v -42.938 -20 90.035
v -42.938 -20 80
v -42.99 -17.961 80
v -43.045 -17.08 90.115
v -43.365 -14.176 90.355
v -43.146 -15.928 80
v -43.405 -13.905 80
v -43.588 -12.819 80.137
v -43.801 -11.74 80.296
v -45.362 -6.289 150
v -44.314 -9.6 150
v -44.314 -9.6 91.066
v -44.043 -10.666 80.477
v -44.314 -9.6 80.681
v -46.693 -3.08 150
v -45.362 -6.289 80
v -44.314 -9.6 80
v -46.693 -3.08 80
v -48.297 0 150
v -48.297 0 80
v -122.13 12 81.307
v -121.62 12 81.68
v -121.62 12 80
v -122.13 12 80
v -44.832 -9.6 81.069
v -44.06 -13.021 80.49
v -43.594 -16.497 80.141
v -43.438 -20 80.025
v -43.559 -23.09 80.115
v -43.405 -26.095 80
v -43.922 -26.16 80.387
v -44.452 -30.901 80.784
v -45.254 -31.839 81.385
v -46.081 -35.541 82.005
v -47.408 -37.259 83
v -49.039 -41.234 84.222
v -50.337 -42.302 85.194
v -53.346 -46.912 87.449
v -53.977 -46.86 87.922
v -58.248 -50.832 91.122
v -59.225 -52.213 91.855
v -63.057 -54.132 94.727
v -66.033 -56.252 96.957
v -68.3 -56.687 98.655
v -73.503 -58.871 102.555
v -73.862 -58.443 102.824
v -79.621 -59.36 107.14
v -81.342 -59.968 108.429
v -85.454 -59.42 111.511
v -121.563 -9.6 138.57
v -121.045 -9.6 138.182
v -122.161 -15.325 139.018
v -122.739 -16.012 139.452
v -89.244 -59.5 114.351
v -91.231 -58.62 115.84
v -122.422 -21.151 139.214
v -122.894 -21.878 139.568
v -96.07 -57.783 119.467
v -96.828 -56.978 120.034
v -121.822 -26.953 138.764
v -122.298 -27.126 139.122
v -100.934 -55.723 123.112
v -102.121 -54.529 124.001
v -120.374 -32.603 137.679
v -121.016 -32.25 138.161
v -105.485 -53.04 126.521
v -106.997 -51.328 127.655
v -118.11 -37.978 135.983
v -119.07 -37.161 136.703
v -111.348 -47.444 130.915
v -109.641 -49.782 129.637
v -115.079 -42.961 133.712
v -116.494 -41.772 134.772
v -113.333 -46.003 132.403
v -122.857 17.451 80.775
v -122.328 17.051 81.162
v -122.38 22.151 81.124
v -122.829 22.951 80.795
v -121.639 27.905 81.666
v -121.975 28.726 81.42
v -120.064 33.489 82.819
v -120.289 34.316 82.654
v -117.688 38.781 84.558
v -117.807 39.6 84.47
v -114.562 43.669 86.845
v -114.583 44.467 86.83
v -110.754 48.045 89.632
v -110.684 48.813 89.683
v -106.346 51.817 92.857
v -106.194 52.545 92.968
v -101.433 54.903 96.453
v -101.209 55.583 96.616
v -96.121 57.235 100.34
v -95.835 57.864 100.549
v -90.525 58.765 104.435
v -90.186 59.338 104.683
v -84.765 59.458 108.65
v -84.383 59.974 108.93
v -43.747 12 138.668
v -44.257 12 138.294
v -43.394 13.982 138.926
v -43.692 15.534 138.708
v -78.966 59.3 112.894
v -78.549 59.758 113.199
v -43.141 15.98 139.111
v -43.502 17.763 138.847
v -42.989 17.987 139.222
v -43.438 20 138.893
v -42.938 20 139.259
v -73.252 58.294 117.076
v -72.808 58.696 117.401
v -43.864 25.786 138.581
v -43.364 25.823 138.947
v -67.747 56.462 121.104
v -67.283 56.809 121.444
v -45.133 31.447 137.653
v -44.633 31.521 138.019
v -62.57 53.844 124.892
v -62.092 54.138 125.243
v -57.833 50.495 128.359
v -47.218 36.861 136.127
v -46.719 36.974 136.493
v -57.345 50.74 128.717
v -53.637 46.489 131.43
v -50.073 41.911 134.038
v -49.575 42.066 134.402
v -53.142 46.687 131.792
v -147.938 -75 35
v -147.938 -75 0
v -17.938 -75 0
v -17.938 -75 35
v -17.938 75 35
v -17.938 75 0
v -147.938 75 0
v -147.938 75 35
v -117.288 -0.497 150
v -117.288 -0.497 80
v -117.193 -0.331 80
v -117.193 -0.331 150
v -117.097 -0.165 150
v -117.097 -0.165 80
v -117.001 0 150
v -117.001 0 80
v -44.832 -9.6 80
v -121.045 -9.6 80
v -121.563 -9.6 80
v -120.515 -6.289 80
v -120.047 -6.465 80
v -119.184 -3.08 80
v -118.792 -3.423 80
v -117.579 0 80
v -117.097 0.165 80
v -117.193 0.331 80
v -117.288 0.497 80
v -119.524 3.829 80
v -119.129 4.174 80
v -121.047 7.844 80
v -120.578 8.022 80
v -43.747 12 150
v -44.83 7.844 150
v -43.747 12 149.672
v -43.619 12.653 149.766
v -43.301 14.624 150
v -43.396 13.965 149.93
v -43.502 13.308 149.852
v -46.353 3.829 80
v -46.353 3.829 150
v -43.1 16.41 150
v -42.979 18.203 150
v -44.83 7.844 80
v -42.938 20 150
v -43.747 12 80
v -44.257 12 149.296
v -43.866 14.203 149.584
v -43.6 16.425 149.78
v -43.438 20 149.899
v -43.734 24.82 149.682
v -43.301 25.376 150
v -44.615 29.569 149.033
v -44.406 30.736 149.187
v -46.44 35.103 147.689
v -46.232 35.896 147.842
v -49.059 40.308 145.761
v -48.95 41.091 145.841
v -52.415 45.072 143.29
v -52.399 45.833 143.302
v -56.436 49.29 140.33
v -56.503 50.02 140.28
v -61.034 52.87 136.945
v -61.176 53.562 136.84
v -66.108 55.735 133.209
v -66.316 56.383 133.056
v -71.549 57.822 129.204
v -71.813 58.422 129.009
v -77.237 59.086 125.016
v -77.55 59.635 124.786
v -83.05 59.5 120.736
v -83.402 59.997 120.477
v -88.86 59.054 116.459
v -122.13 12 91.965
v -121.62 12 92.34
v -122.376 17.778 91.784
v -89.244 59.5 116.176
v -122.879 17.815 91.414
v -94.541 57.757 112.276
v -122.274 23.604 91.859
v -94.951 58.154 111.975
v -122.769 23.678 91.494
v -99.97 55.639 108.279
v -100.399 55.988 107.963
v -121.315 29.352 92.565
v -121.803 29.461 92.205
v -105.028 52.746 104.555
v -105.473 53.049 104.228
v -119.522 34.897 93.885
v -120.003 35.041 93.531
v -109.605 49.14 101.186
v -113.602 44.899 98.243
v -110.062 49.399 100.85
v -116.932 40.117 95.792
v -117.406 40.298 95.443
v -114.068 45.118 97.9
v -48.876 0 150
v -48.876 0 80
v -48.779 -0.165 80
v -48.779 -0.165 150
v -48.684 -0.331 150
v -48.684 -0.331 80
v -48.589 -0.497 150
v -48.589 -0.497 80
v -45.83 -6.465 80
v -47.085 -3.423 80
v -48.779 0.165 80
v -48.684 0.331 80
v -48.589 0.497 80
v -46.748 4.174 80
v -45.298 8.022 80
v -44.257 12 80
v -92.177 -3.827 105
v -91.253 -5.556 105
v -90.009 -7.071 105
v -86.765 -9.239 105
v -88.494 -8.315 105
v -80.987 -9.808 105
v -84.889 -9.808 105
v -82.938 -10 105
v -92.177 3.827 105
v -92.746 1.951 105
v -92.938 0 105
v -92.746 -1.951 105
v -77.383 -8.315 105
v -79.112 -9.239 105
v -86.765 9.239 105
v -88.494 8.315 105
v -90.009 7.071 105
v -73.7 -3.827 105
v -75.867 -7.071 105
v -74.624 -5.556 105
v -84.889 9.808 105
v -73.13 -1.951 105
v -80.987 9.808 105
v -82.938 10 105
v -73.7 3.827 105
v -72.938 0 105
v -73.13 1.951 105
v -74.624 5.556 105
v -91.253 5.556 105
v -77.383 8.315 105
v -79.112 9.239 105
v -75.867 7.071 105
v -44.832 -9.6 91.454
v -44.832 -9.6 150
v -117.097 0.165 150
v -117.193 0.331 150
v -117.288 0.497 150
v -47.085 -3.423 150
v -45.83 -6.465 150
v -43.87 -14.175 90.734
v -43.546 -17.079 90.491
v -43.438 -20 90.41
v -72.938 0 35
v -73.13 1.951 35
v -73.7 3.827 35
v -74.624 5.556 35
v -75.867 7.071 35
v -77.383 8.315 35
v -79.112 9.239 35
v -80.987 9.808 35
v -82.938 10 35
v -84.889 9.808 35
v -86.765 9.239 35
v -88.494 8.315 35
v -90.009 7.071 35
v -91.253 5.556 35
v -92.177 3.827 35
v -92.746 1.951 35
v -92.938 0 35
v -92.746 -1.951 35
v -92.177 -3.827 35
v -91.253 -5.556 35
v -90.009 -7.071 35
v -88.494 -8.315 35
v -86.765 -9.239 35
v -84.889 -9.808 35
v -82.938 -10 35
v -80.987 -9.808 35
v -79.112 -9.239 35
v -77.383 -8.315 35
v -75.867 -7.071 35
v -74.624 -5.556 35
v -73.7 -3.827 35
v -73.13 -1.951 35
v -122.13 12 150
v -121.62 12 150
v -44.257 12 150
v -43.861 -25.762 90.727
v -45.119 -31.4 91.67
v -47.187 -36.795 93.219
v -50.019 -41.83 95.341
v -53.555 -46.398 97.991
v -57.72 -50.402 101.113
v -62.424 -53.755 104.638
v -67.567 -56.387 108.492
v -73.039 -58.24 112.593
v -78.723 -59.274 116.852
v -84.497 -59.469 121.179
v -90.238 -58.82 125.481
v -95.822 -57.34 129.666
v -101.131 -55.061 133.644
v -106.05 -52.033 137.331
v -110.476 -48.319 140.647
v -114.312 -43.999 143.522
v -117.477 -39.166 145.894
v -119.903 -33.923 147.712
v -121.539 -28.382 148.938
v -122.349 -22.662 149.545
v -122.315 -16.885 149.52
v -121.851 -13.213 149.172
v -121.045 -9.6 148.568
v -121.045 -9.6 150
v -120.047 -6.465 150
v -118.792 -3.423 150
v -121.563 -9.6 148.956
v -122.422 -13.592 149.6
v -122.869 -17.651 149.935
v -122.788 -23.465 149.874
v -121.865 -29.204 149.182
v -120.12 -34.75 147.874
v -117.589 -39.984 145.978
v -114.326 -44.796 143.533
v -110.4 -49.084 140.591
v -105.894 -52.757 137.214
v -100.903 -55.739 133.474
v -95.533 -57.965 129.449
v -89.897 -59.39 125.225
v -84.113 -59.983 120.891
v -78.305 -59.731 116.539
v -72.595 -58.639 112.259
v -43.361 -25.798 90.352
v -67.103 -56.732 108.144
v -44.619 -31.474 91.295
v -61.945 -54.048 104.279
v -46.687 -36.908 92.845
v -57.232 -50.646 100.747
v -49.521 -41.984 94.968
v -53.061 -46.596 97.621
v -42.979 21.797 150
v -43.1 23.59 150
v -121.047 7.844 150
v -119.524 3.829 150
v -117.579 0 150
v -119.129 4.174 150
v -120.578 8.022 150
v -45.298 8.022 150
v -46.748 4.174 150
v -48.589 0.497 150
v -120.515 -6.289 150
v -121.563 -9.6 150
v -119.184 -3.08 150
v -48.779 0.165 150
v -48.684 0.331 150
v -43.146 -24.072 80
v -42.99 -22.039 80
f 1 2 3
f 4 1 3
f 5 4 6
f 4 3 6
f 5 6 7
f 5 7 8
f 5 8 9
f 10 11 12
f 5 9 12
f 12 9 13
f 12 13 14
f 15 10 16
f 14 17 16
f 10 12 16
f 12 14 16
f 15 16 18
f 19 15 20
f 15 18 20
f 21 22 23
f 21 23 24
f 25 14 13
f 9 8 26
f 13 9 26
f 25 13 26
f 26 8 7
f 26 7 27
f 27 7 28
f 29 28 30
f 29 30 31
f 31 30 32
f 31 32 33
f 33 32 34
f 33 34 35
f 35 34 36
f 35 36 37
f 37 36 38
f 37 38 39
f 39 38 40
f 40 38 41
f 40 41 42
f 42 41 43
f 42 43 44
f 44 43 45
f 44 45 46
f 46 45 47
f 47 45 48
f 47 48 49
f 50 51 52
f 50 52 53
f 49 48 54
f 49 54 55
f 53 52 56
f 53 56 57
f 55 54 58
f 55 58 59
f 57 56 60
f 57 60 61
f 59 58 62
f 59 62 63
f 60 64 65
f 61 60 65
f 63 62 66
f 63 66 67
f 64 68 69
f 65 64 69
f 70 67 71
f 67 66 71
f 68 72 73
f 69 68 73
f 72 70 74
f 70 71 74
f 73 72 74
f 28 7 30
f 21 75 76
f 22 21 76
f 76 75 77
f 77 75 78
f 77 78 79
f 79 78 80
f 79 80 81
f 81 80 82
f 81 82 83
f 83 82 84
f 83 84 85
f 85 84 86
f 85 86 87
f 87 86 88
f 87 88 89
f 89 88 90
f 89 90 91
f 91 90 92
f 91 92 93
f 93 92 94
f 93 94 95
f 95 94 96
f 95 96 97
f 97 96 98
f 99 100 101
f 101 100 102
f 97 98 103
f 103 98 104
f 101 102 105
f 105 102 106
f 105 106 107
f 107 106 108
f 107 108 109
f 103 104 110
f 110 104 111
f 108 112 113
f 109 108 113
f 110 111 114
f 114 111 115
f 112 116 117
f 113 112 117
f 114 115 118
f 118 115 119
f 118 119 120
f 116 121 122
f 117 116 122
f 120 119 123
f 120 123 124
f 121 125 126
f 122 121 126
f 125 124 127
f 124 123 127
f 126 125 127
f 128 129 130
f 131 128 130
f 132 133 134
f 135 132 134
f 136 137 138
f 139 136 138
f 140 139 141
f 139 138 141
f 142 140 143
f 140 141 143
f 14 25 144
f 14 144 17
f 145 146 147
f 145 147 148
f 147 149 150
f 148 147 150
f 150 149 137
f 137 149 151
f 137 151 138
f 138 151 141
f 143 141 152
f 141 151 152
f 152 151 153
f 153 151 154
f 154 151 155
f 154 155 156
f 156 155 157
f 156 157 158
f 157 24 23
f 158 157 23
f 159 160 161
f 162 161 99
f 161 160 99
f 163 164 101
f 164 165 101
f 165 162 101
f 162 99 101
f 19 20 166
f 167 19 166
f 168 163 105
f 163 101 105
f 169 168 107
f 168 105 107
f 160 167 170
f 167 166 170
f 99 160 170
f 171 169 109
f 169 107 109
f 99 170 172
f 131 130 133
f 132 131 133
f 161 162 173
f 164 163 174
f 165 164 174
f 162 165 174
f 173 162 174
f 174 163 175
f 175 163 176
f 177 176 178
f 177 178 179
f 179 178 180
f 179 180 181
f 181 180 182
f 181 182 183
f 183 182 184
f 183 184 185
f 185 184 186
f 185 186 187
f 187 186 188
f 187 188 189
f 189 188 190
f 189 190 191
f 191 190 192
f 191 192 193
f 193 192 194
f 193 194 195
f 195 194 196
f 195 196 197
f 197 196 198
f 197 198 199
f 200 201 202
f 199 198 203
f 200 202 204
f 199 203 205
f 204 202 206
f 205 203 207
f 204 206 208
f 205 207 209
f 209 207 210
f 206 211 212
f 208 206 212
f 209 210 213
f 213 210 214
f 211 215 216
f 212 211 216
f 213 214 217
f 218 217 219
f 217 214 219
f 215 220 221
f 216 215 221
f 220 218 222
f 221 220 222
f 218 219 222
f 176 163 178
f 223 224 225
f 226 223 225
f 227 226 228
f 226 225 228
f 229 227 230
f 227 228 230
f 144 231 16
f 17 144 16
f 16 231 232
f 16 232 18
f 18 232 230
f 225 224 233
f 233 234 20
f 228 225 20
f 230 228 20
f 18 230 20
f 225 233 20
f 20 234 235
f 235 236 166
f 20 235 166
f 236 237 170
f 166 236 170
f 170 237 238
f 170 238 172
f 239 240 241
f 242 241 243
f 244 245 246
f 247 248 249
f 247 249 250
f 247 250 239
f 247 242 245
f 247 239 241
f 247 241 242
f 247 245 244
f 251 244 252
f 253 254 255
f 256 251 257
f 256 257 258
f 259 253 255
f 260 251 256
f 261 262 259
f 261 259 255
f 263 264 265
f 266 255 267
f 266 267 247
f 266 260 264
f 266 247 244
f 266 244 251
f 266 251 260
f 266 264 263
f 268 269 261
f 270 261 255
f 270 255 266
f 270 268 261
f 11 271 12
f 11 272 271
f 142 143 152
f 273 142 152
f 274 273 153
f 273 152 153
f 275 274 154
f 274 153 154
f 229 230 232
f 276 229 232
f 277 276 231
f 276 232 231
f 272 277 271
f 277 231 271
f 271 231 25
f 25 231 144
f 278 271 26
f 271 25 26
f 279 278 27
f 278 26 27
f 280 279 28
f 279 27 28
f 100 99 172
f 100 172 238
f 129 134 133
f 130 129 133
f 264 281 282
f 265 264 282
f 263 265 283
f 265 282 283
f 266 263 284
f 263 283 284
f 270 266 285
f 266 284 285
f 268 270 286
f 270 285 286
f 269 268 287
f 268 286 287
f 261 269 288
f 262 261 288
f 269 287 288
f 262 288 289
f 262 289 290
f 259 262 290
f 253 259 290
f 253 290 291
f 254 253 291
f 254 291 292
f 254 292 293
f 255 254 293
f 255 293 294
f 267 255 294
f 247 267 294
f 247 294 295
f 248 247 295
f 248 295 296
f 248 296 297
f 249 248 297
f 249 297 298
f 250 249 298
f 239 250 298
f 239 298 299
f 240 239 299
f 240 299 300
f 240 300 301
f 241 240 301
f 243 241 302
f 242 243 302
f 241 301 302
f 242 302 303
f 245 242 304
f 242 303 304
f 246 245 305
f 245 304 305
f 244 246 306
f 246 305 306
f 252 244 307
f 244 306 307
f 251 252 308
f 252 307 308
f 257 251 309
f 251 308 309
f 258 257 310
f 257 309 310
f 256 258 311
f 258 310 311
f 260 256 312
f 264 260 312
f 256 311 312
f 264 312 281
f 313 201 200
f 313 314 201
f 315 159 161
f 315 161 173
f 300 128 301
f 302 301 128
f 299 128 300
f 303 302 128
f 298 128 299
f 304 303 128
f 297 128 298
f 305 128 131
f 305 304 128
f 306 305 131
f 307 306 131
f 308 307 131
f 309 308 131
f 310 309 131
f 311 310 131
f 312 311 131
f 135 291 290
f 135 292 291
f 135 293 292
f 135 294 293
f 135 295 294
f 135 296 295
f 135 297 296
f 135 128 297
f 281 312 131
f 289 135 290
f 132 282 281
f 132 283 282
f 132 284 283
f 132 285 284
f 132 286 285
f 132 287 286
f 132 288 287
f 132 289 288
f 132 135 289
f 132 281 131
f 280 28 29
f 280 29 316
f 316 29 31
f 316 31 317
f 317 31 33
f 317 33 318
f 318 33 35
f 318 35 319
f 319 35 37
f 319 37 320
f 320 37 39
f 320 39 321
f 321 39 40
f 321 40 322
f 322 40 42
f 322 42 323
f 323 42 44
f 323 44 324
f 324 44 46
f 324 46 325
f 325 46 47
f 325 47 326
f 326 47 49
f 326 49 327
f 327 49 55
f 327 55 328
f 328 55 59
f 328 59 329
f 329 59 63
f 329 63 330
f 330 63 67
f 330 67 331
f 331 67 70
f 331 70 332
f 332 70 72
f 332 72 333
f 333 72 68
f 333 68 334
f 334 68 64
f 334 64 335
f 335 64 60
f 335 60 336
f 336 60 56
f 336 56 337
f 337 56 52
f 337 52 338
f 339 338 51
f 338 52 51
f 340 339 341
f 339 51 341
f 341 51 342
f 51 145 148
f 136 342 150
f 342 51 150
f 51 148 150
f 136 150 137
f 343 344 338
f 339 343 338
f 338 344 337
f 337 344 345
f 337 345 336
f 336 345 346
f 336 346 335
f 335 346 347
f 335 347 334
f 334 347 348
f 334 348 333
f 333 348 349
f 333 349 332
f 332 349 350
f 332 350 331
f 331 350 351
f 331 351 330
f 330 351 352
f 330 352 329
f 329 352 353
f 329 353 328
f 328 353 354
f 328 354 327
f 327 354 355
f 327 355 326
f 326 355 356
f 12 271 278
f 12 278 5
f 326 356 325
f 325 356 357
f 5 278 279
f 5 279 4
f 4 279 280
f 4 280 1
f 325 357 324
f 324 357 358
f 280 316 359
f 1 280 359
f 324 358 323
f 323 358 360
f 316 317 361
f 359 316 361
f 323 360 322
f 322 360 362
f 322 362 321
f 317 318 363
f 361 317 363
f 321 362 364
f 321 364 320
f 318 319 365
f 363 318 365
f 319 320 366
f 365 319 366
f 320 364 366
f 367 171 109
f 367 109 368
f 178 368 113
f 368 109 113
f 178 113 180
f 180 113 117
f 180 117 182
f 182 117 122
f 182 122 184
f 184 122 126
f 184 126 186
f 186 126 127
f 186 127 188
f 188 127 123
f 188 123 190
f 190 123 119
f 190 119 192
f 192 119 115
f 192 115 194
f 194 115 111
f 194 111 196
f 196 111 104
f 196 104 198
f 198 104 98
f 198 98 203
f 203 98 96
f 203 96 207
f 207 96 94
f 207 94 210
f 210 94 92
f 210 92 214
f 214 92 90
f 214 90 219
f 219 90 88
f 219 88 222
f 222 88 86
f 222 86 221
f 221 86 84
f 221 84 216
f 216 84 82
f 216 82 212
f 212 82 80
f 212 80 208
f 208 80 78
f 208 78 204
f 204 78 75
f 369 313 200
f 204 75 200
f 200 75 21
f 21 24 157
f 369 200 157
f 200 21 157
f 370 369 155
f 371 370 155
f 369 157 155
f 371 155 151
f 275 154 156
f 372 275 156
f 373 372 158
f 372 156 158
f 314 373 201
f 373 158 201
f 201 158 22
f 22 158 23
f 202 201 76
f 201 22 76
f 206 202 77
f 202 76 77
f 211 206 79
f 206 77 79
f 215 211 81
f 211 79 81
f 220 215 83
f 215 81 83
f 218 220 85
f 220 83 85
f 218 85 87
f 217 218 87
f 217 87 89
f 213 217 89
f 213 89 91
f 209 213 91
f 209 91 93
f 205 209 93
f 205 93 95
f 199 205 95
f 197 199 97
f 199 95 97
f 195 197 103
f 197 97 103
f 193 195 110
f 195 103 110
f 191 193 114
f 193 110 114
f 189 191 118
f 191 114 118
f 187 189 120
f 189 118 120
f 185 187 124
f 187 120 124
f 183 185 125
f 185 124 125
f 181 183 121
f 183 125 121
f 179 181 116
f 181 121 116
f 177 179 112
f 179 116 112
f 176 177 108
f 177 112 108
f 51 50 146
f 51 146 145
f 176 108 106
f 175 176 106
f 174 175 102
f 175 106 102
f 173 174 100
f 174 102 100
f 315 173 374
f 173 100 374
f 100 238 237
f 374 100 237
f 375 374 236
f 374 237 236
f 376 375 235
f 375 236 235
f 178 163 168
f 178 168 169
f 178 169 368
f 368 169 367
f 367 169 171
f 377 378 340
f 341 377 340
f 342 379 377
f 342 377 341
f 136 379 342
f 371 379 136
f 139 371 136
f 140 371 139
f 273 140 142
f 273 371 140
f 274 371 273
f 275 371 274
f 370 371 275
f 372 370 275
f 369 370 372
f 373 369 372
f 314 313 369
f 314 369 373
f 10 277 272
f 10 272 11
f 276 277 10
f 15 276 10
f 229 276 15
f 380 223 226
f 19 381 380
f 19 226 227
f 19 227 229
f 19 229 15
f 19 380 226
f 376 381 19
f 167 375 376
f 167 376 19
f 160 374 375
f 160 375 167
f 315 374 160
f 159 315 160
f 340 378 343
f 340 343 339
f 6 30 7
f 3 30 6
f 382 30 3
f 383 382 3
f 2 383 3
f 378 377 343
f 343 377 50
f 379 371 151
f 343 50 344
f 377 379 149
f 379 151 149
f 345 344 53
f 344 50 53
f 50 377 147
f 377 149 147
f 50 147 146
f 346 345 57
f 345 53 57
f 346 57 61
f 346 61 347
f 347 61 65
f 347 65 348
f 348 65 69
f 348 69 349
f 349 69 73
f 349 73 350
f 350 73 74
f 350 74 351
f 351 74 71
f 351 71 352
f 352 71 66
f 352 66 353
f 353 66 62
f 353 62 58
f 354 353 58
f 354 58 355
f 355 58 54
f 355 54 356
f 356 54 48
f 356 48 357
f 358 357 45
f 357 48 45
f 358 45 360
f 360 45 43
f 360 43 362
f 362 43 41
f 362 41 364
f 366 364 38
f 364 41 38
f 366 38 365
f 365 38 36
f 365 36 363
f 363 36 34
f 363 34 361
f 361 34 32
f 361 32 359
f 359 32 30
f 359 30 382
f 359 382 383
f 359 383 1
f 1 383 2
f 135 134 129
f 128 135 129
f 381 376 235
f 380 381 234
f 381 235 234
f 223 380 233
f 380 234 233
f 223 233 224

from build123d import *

# Parameters (mm, degrees)
F1_DEPTH = 35
F2_R     = 10
F3_DEPTH = 45
F5_DEPTH = 70
F7_DEPTH = 63
F9_DEPTH = 65.4


with BuildPart() as f1:
    # F0 (on Top) → F1 (new body)
    with BuildSketch(Plane.XY):
        Polygon((-147.9383396478, 75), (-147.9383396478, 0), (-147.9383396478, -75), (-17.9383396478, -75), (-17.9383396478, 0), (-17.9383396478, 75), align=None)
    extrude(amount=F1_DEPTH)

    # F2 (on face) → F3 (join)
    with BuildSketch(Plane.XY.offset(35)):
        with Locations((-82.9383396478, 0)):
            Circle(F2_R)
    extrude(amount=F3_DEPTH)

    # F2 (on face) → F5, piece 2 (join)
    with BuildSketch(Plane.XY.offset(35)):
        with Locations((-82.9383396478, 0)):
            Circle(F2_R)
    extrude(amount=F5_DEPTH)


with BuildPart() as f5:
    # F4 (on face) → F5 (new body)
    with BuildSketch(Plane.XY.offset(80)):
        with BuildLine():
            ThreePointArc((-48.5889857203, 0.496875), (-48.7315391647, 0.2479165476), (-48.8758969873, 0))
            ThreePointArc((-48.8758969873, 0), (-48.7315391647, -0.2479165476), (-48.5889857203, -0.496875))
            ThreePointArc((-48.5889857203, -0.496875), (-48.4422599851, -0.2489626377), (-48.2973234964, 0))
            ThreePointArc((-48.2973234964, 0), (-48.4422599851, 0.2489626377), (-48.5889857203, 0.496875))
        make_face()
        with BuildLine():
            ThreePointArc((-117.2876935753, -0.496875), (-117.1451401309, -0.2479165476), (-117.0007823083, 0))
            ThreePointArc((-117.0007823083, 0), (-117.1451401309, 0.2479165476), (-117.2876935753, 0.496875))
            ThreePointArc((-117.2876935753, 0.496875), (-117.4344193105, 0.2489626377), (-117.5793557992, 0))
            ThreePointArc((-117.5793557992, 0), (-117.4344193105, -0.2489626377), (-117.2876935753, -0.496875))
        make_face()
        with BuildLine():
            ThreePointArc((-43.4383396478, 20), (-44.7477028363, 9.9141058933), (-48.5889857203, 0.496875))
            ThreePointArc((-48.5889857203, 0.496875), (-48.4422599851, 0.2489626377), (-48.2973234964, 0))
            ThreePointArc((-48.2973234964, 0), (-44.3013065963, 9.6472381959), (-42.9383396478, 20))
            ThreePointArc((-42.9383396478, 20), (-93.2911014519, 58.6370330516), (-117.5793557992, 0))
            ThreePointArc((-117.5793557992, 0), (-117.4344193105, 0.2489626377), (-117.2876935753, 0.496875))
            ThreePointArc((-117.2876935753, 0.496875), (-93.0242337546, 58.1906368115), (-43.4383396478, 20))
        make_face()
        with BuildLine():
            ThreePointArc((-48.2973234964, 0), (-48.4422599851, -0.2489626377), (-48.5889857203, -0.496875))
            ThreePointArc((-48.5889857203, -0.496875), (-44.7477028363, -9.9141058933), (-43.4383396478, -20))
            ThreePointArc((-43.4383396478, -20), (-93.0242337546, -58.1906368115), (-117.2876935753, -0.496875))
            ThreePointArc((-117.2876935753, -0.496875), (-117.4344193105, -0.2489626377), (-117.5793557992, 0))
            ThreePointArc((-117.5793557992, 0), (-93.2911014519, -58.6370330516), (-42.9383396478, -20))
            ThreePointArc((-42.9383396478, -20), (-44.3013065963, -9.6472381959), (-48.2973234964, 0))
        make_face()
    extrude(amount=F5_DEPTH)

    # F6 (on face) → F7 (cut)
    with BuildSketch(Plane(origin=(0, 75, 0), x_dir=(-1, 0, 0), z_dir=(0, 1, 0))):
        Polygon((39.7482812405, 157.8890830278), (42.9177470505, 150.2823531628), (123.4222427011, 91.013289988), (145.2915817499, 160.4246497154), align=None)
        Polygon((125.323921442, 78.9693146944), (42.6008030772, 139.5061612129), (35.6279686093, 78.9693146944), (96.798710525, 78.9693146944), (115.498572588, 72.6303756237), align=None)
    extrude(amount=-F7_DEPTH, mode=Mode.SUBTRACT)

    # F8 (on face) → F9 (cut)
    with BuildSketch(Plane.XZ.offset(75)):
        Polygon((-33.7830297649, 154.05420959), (-123.1365576386, 150.1351892948), (-42.6008105278, 89.782372117), align=None)
        Polygon((-126.3355825414, 79.9848362803), (-42.6008105278, 79.3969780207), (-126.3355825414, 142.1471177791), align=None)
    extrude(amount=-F9_DEPTH, mode=Mode.SUBTRACT)


solid = Compound([f1.part, f5.part])
